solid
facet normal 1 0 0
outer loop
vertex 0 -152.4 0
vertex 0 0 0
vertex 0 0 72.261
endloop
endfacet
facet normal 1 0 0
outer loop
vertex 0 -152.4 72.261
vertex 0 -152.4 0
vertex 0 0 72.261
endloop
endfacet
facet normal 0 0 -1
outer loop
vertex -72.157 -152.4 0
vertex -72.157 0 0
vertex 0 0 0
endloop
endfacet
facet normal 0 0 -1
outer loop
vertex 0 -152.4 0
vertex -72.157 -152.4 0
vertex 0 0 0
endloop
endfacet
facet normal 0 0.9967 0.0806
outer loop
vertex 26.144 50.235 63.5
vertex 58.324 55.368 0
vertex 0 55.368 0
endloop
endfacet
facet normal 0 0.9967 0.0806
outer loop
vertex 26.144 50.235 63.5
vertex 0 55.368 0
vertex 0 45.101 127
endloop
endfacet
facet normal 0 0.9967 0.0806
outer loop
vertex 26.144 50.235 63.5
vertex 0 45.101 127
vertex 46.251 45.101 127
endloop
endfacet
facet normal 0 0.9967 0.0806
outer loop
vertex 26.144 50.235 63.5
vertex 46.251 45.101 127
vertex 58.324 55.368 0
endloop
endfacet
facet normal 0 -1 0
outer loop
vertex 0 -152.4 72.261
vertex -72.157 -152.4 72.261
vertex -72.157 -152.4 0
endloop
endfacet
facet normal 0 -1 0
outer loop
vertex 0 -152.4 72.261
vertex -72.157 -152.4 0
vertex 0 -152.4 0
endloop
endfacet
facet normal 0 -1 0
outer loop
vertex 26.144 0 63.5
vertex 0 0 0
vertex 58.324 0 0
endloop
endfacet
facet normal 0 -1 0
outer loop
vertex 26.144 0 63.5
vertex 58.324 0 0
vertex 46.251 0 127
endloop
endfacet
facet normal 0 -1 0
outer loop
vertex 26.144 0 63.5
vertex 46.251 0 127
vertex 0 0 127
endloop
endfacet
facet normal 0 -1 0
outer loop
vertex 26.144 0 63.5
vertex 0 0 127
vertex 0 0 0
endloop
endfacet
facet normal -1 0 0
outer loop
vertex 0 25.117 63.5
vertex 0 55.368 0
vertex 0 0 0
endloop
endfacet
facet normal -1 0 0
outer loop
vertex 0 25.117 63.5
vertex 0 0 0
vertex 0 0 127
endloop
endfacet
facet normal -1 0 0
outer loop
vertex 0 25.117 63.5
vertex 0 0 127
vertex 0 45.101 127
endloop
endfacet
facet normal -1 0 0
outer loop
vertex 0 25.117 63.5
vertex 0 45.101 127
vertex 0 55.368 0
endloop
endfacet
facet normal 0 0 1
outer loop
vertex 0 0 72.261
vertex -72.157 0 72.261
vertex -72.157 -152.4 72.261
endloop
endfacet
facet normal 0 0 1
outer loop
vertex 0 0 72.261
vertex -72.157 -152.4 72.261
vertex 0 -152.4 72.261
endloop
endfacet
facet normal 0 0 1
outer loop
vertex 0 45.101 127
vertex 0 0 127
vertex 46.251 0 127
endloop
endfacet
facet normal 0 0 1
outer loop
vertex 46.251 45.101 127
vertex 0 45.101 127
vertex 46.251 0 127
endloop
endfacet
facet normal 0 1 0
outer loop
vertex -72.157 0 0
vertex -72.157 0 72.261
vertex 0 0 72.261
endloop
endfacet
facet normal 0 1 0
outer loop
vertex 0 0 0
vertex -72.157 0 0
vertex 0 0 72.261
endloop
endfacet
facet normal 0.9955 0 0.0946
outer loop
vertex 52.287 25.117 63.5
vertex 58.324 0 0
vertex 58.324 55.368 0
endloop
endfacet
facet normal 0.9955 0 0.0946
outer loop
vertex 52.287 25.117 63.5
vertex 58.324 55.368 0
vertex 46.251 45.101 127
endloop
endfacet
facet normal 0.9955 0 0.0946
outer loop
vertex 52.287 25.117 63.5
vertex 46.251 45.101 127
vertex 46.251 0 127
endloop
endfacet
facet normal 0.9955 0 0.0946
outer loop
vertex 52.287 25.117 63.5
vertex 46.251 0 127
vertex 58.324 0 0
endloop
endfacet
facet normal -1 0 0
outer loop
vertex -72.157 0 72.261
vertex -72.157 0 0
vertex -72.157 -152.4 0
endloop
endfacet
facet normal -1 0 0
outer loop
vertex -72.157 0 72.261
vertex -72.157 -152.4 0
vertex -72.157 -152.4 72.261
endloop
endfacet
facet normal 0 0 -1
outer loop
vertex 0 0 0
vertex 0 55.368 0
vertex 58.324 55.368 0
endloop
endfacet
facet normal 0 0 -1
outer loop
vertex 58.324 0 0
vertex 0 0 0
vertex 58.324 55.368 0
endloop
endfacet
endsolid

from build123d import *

# Parameters (mm, degrees)
F0_W     = 58.32402
F0_H     = 55.36842
F2_W     = 46.250932
F2_H     = 45.101054
F4_W     = 72.157308
F4_H     = 72.260797
F5_DEPTH = 152.4


with BuildPart() as f3:
    # F0 (on Top) → F3 section 0
    with BuildSketch(Plane.XY):
        with Locations((29.16201, 27.68421)):
            Rectangle(F0_W, F0_H)
    # F2 (on offset) → F3 section 1
    with BuildSketch(Plane.XY.offset(127)):
        with Locations((23.125466, 22.550527)):
            Rectangle(F2_W, F2_H)
    loft()


with BuildPart() as f5:
    # F4 (on Front) → F5 (new body)
    with BuildSketch(Plane.XZ):
        with Locations((-36.078654, 36.130398)):
            Rectangle(F4_W, F4_H)
    extrude(amount=F5_DEPTH)


solid = Compound([f3.part, f5.part])
